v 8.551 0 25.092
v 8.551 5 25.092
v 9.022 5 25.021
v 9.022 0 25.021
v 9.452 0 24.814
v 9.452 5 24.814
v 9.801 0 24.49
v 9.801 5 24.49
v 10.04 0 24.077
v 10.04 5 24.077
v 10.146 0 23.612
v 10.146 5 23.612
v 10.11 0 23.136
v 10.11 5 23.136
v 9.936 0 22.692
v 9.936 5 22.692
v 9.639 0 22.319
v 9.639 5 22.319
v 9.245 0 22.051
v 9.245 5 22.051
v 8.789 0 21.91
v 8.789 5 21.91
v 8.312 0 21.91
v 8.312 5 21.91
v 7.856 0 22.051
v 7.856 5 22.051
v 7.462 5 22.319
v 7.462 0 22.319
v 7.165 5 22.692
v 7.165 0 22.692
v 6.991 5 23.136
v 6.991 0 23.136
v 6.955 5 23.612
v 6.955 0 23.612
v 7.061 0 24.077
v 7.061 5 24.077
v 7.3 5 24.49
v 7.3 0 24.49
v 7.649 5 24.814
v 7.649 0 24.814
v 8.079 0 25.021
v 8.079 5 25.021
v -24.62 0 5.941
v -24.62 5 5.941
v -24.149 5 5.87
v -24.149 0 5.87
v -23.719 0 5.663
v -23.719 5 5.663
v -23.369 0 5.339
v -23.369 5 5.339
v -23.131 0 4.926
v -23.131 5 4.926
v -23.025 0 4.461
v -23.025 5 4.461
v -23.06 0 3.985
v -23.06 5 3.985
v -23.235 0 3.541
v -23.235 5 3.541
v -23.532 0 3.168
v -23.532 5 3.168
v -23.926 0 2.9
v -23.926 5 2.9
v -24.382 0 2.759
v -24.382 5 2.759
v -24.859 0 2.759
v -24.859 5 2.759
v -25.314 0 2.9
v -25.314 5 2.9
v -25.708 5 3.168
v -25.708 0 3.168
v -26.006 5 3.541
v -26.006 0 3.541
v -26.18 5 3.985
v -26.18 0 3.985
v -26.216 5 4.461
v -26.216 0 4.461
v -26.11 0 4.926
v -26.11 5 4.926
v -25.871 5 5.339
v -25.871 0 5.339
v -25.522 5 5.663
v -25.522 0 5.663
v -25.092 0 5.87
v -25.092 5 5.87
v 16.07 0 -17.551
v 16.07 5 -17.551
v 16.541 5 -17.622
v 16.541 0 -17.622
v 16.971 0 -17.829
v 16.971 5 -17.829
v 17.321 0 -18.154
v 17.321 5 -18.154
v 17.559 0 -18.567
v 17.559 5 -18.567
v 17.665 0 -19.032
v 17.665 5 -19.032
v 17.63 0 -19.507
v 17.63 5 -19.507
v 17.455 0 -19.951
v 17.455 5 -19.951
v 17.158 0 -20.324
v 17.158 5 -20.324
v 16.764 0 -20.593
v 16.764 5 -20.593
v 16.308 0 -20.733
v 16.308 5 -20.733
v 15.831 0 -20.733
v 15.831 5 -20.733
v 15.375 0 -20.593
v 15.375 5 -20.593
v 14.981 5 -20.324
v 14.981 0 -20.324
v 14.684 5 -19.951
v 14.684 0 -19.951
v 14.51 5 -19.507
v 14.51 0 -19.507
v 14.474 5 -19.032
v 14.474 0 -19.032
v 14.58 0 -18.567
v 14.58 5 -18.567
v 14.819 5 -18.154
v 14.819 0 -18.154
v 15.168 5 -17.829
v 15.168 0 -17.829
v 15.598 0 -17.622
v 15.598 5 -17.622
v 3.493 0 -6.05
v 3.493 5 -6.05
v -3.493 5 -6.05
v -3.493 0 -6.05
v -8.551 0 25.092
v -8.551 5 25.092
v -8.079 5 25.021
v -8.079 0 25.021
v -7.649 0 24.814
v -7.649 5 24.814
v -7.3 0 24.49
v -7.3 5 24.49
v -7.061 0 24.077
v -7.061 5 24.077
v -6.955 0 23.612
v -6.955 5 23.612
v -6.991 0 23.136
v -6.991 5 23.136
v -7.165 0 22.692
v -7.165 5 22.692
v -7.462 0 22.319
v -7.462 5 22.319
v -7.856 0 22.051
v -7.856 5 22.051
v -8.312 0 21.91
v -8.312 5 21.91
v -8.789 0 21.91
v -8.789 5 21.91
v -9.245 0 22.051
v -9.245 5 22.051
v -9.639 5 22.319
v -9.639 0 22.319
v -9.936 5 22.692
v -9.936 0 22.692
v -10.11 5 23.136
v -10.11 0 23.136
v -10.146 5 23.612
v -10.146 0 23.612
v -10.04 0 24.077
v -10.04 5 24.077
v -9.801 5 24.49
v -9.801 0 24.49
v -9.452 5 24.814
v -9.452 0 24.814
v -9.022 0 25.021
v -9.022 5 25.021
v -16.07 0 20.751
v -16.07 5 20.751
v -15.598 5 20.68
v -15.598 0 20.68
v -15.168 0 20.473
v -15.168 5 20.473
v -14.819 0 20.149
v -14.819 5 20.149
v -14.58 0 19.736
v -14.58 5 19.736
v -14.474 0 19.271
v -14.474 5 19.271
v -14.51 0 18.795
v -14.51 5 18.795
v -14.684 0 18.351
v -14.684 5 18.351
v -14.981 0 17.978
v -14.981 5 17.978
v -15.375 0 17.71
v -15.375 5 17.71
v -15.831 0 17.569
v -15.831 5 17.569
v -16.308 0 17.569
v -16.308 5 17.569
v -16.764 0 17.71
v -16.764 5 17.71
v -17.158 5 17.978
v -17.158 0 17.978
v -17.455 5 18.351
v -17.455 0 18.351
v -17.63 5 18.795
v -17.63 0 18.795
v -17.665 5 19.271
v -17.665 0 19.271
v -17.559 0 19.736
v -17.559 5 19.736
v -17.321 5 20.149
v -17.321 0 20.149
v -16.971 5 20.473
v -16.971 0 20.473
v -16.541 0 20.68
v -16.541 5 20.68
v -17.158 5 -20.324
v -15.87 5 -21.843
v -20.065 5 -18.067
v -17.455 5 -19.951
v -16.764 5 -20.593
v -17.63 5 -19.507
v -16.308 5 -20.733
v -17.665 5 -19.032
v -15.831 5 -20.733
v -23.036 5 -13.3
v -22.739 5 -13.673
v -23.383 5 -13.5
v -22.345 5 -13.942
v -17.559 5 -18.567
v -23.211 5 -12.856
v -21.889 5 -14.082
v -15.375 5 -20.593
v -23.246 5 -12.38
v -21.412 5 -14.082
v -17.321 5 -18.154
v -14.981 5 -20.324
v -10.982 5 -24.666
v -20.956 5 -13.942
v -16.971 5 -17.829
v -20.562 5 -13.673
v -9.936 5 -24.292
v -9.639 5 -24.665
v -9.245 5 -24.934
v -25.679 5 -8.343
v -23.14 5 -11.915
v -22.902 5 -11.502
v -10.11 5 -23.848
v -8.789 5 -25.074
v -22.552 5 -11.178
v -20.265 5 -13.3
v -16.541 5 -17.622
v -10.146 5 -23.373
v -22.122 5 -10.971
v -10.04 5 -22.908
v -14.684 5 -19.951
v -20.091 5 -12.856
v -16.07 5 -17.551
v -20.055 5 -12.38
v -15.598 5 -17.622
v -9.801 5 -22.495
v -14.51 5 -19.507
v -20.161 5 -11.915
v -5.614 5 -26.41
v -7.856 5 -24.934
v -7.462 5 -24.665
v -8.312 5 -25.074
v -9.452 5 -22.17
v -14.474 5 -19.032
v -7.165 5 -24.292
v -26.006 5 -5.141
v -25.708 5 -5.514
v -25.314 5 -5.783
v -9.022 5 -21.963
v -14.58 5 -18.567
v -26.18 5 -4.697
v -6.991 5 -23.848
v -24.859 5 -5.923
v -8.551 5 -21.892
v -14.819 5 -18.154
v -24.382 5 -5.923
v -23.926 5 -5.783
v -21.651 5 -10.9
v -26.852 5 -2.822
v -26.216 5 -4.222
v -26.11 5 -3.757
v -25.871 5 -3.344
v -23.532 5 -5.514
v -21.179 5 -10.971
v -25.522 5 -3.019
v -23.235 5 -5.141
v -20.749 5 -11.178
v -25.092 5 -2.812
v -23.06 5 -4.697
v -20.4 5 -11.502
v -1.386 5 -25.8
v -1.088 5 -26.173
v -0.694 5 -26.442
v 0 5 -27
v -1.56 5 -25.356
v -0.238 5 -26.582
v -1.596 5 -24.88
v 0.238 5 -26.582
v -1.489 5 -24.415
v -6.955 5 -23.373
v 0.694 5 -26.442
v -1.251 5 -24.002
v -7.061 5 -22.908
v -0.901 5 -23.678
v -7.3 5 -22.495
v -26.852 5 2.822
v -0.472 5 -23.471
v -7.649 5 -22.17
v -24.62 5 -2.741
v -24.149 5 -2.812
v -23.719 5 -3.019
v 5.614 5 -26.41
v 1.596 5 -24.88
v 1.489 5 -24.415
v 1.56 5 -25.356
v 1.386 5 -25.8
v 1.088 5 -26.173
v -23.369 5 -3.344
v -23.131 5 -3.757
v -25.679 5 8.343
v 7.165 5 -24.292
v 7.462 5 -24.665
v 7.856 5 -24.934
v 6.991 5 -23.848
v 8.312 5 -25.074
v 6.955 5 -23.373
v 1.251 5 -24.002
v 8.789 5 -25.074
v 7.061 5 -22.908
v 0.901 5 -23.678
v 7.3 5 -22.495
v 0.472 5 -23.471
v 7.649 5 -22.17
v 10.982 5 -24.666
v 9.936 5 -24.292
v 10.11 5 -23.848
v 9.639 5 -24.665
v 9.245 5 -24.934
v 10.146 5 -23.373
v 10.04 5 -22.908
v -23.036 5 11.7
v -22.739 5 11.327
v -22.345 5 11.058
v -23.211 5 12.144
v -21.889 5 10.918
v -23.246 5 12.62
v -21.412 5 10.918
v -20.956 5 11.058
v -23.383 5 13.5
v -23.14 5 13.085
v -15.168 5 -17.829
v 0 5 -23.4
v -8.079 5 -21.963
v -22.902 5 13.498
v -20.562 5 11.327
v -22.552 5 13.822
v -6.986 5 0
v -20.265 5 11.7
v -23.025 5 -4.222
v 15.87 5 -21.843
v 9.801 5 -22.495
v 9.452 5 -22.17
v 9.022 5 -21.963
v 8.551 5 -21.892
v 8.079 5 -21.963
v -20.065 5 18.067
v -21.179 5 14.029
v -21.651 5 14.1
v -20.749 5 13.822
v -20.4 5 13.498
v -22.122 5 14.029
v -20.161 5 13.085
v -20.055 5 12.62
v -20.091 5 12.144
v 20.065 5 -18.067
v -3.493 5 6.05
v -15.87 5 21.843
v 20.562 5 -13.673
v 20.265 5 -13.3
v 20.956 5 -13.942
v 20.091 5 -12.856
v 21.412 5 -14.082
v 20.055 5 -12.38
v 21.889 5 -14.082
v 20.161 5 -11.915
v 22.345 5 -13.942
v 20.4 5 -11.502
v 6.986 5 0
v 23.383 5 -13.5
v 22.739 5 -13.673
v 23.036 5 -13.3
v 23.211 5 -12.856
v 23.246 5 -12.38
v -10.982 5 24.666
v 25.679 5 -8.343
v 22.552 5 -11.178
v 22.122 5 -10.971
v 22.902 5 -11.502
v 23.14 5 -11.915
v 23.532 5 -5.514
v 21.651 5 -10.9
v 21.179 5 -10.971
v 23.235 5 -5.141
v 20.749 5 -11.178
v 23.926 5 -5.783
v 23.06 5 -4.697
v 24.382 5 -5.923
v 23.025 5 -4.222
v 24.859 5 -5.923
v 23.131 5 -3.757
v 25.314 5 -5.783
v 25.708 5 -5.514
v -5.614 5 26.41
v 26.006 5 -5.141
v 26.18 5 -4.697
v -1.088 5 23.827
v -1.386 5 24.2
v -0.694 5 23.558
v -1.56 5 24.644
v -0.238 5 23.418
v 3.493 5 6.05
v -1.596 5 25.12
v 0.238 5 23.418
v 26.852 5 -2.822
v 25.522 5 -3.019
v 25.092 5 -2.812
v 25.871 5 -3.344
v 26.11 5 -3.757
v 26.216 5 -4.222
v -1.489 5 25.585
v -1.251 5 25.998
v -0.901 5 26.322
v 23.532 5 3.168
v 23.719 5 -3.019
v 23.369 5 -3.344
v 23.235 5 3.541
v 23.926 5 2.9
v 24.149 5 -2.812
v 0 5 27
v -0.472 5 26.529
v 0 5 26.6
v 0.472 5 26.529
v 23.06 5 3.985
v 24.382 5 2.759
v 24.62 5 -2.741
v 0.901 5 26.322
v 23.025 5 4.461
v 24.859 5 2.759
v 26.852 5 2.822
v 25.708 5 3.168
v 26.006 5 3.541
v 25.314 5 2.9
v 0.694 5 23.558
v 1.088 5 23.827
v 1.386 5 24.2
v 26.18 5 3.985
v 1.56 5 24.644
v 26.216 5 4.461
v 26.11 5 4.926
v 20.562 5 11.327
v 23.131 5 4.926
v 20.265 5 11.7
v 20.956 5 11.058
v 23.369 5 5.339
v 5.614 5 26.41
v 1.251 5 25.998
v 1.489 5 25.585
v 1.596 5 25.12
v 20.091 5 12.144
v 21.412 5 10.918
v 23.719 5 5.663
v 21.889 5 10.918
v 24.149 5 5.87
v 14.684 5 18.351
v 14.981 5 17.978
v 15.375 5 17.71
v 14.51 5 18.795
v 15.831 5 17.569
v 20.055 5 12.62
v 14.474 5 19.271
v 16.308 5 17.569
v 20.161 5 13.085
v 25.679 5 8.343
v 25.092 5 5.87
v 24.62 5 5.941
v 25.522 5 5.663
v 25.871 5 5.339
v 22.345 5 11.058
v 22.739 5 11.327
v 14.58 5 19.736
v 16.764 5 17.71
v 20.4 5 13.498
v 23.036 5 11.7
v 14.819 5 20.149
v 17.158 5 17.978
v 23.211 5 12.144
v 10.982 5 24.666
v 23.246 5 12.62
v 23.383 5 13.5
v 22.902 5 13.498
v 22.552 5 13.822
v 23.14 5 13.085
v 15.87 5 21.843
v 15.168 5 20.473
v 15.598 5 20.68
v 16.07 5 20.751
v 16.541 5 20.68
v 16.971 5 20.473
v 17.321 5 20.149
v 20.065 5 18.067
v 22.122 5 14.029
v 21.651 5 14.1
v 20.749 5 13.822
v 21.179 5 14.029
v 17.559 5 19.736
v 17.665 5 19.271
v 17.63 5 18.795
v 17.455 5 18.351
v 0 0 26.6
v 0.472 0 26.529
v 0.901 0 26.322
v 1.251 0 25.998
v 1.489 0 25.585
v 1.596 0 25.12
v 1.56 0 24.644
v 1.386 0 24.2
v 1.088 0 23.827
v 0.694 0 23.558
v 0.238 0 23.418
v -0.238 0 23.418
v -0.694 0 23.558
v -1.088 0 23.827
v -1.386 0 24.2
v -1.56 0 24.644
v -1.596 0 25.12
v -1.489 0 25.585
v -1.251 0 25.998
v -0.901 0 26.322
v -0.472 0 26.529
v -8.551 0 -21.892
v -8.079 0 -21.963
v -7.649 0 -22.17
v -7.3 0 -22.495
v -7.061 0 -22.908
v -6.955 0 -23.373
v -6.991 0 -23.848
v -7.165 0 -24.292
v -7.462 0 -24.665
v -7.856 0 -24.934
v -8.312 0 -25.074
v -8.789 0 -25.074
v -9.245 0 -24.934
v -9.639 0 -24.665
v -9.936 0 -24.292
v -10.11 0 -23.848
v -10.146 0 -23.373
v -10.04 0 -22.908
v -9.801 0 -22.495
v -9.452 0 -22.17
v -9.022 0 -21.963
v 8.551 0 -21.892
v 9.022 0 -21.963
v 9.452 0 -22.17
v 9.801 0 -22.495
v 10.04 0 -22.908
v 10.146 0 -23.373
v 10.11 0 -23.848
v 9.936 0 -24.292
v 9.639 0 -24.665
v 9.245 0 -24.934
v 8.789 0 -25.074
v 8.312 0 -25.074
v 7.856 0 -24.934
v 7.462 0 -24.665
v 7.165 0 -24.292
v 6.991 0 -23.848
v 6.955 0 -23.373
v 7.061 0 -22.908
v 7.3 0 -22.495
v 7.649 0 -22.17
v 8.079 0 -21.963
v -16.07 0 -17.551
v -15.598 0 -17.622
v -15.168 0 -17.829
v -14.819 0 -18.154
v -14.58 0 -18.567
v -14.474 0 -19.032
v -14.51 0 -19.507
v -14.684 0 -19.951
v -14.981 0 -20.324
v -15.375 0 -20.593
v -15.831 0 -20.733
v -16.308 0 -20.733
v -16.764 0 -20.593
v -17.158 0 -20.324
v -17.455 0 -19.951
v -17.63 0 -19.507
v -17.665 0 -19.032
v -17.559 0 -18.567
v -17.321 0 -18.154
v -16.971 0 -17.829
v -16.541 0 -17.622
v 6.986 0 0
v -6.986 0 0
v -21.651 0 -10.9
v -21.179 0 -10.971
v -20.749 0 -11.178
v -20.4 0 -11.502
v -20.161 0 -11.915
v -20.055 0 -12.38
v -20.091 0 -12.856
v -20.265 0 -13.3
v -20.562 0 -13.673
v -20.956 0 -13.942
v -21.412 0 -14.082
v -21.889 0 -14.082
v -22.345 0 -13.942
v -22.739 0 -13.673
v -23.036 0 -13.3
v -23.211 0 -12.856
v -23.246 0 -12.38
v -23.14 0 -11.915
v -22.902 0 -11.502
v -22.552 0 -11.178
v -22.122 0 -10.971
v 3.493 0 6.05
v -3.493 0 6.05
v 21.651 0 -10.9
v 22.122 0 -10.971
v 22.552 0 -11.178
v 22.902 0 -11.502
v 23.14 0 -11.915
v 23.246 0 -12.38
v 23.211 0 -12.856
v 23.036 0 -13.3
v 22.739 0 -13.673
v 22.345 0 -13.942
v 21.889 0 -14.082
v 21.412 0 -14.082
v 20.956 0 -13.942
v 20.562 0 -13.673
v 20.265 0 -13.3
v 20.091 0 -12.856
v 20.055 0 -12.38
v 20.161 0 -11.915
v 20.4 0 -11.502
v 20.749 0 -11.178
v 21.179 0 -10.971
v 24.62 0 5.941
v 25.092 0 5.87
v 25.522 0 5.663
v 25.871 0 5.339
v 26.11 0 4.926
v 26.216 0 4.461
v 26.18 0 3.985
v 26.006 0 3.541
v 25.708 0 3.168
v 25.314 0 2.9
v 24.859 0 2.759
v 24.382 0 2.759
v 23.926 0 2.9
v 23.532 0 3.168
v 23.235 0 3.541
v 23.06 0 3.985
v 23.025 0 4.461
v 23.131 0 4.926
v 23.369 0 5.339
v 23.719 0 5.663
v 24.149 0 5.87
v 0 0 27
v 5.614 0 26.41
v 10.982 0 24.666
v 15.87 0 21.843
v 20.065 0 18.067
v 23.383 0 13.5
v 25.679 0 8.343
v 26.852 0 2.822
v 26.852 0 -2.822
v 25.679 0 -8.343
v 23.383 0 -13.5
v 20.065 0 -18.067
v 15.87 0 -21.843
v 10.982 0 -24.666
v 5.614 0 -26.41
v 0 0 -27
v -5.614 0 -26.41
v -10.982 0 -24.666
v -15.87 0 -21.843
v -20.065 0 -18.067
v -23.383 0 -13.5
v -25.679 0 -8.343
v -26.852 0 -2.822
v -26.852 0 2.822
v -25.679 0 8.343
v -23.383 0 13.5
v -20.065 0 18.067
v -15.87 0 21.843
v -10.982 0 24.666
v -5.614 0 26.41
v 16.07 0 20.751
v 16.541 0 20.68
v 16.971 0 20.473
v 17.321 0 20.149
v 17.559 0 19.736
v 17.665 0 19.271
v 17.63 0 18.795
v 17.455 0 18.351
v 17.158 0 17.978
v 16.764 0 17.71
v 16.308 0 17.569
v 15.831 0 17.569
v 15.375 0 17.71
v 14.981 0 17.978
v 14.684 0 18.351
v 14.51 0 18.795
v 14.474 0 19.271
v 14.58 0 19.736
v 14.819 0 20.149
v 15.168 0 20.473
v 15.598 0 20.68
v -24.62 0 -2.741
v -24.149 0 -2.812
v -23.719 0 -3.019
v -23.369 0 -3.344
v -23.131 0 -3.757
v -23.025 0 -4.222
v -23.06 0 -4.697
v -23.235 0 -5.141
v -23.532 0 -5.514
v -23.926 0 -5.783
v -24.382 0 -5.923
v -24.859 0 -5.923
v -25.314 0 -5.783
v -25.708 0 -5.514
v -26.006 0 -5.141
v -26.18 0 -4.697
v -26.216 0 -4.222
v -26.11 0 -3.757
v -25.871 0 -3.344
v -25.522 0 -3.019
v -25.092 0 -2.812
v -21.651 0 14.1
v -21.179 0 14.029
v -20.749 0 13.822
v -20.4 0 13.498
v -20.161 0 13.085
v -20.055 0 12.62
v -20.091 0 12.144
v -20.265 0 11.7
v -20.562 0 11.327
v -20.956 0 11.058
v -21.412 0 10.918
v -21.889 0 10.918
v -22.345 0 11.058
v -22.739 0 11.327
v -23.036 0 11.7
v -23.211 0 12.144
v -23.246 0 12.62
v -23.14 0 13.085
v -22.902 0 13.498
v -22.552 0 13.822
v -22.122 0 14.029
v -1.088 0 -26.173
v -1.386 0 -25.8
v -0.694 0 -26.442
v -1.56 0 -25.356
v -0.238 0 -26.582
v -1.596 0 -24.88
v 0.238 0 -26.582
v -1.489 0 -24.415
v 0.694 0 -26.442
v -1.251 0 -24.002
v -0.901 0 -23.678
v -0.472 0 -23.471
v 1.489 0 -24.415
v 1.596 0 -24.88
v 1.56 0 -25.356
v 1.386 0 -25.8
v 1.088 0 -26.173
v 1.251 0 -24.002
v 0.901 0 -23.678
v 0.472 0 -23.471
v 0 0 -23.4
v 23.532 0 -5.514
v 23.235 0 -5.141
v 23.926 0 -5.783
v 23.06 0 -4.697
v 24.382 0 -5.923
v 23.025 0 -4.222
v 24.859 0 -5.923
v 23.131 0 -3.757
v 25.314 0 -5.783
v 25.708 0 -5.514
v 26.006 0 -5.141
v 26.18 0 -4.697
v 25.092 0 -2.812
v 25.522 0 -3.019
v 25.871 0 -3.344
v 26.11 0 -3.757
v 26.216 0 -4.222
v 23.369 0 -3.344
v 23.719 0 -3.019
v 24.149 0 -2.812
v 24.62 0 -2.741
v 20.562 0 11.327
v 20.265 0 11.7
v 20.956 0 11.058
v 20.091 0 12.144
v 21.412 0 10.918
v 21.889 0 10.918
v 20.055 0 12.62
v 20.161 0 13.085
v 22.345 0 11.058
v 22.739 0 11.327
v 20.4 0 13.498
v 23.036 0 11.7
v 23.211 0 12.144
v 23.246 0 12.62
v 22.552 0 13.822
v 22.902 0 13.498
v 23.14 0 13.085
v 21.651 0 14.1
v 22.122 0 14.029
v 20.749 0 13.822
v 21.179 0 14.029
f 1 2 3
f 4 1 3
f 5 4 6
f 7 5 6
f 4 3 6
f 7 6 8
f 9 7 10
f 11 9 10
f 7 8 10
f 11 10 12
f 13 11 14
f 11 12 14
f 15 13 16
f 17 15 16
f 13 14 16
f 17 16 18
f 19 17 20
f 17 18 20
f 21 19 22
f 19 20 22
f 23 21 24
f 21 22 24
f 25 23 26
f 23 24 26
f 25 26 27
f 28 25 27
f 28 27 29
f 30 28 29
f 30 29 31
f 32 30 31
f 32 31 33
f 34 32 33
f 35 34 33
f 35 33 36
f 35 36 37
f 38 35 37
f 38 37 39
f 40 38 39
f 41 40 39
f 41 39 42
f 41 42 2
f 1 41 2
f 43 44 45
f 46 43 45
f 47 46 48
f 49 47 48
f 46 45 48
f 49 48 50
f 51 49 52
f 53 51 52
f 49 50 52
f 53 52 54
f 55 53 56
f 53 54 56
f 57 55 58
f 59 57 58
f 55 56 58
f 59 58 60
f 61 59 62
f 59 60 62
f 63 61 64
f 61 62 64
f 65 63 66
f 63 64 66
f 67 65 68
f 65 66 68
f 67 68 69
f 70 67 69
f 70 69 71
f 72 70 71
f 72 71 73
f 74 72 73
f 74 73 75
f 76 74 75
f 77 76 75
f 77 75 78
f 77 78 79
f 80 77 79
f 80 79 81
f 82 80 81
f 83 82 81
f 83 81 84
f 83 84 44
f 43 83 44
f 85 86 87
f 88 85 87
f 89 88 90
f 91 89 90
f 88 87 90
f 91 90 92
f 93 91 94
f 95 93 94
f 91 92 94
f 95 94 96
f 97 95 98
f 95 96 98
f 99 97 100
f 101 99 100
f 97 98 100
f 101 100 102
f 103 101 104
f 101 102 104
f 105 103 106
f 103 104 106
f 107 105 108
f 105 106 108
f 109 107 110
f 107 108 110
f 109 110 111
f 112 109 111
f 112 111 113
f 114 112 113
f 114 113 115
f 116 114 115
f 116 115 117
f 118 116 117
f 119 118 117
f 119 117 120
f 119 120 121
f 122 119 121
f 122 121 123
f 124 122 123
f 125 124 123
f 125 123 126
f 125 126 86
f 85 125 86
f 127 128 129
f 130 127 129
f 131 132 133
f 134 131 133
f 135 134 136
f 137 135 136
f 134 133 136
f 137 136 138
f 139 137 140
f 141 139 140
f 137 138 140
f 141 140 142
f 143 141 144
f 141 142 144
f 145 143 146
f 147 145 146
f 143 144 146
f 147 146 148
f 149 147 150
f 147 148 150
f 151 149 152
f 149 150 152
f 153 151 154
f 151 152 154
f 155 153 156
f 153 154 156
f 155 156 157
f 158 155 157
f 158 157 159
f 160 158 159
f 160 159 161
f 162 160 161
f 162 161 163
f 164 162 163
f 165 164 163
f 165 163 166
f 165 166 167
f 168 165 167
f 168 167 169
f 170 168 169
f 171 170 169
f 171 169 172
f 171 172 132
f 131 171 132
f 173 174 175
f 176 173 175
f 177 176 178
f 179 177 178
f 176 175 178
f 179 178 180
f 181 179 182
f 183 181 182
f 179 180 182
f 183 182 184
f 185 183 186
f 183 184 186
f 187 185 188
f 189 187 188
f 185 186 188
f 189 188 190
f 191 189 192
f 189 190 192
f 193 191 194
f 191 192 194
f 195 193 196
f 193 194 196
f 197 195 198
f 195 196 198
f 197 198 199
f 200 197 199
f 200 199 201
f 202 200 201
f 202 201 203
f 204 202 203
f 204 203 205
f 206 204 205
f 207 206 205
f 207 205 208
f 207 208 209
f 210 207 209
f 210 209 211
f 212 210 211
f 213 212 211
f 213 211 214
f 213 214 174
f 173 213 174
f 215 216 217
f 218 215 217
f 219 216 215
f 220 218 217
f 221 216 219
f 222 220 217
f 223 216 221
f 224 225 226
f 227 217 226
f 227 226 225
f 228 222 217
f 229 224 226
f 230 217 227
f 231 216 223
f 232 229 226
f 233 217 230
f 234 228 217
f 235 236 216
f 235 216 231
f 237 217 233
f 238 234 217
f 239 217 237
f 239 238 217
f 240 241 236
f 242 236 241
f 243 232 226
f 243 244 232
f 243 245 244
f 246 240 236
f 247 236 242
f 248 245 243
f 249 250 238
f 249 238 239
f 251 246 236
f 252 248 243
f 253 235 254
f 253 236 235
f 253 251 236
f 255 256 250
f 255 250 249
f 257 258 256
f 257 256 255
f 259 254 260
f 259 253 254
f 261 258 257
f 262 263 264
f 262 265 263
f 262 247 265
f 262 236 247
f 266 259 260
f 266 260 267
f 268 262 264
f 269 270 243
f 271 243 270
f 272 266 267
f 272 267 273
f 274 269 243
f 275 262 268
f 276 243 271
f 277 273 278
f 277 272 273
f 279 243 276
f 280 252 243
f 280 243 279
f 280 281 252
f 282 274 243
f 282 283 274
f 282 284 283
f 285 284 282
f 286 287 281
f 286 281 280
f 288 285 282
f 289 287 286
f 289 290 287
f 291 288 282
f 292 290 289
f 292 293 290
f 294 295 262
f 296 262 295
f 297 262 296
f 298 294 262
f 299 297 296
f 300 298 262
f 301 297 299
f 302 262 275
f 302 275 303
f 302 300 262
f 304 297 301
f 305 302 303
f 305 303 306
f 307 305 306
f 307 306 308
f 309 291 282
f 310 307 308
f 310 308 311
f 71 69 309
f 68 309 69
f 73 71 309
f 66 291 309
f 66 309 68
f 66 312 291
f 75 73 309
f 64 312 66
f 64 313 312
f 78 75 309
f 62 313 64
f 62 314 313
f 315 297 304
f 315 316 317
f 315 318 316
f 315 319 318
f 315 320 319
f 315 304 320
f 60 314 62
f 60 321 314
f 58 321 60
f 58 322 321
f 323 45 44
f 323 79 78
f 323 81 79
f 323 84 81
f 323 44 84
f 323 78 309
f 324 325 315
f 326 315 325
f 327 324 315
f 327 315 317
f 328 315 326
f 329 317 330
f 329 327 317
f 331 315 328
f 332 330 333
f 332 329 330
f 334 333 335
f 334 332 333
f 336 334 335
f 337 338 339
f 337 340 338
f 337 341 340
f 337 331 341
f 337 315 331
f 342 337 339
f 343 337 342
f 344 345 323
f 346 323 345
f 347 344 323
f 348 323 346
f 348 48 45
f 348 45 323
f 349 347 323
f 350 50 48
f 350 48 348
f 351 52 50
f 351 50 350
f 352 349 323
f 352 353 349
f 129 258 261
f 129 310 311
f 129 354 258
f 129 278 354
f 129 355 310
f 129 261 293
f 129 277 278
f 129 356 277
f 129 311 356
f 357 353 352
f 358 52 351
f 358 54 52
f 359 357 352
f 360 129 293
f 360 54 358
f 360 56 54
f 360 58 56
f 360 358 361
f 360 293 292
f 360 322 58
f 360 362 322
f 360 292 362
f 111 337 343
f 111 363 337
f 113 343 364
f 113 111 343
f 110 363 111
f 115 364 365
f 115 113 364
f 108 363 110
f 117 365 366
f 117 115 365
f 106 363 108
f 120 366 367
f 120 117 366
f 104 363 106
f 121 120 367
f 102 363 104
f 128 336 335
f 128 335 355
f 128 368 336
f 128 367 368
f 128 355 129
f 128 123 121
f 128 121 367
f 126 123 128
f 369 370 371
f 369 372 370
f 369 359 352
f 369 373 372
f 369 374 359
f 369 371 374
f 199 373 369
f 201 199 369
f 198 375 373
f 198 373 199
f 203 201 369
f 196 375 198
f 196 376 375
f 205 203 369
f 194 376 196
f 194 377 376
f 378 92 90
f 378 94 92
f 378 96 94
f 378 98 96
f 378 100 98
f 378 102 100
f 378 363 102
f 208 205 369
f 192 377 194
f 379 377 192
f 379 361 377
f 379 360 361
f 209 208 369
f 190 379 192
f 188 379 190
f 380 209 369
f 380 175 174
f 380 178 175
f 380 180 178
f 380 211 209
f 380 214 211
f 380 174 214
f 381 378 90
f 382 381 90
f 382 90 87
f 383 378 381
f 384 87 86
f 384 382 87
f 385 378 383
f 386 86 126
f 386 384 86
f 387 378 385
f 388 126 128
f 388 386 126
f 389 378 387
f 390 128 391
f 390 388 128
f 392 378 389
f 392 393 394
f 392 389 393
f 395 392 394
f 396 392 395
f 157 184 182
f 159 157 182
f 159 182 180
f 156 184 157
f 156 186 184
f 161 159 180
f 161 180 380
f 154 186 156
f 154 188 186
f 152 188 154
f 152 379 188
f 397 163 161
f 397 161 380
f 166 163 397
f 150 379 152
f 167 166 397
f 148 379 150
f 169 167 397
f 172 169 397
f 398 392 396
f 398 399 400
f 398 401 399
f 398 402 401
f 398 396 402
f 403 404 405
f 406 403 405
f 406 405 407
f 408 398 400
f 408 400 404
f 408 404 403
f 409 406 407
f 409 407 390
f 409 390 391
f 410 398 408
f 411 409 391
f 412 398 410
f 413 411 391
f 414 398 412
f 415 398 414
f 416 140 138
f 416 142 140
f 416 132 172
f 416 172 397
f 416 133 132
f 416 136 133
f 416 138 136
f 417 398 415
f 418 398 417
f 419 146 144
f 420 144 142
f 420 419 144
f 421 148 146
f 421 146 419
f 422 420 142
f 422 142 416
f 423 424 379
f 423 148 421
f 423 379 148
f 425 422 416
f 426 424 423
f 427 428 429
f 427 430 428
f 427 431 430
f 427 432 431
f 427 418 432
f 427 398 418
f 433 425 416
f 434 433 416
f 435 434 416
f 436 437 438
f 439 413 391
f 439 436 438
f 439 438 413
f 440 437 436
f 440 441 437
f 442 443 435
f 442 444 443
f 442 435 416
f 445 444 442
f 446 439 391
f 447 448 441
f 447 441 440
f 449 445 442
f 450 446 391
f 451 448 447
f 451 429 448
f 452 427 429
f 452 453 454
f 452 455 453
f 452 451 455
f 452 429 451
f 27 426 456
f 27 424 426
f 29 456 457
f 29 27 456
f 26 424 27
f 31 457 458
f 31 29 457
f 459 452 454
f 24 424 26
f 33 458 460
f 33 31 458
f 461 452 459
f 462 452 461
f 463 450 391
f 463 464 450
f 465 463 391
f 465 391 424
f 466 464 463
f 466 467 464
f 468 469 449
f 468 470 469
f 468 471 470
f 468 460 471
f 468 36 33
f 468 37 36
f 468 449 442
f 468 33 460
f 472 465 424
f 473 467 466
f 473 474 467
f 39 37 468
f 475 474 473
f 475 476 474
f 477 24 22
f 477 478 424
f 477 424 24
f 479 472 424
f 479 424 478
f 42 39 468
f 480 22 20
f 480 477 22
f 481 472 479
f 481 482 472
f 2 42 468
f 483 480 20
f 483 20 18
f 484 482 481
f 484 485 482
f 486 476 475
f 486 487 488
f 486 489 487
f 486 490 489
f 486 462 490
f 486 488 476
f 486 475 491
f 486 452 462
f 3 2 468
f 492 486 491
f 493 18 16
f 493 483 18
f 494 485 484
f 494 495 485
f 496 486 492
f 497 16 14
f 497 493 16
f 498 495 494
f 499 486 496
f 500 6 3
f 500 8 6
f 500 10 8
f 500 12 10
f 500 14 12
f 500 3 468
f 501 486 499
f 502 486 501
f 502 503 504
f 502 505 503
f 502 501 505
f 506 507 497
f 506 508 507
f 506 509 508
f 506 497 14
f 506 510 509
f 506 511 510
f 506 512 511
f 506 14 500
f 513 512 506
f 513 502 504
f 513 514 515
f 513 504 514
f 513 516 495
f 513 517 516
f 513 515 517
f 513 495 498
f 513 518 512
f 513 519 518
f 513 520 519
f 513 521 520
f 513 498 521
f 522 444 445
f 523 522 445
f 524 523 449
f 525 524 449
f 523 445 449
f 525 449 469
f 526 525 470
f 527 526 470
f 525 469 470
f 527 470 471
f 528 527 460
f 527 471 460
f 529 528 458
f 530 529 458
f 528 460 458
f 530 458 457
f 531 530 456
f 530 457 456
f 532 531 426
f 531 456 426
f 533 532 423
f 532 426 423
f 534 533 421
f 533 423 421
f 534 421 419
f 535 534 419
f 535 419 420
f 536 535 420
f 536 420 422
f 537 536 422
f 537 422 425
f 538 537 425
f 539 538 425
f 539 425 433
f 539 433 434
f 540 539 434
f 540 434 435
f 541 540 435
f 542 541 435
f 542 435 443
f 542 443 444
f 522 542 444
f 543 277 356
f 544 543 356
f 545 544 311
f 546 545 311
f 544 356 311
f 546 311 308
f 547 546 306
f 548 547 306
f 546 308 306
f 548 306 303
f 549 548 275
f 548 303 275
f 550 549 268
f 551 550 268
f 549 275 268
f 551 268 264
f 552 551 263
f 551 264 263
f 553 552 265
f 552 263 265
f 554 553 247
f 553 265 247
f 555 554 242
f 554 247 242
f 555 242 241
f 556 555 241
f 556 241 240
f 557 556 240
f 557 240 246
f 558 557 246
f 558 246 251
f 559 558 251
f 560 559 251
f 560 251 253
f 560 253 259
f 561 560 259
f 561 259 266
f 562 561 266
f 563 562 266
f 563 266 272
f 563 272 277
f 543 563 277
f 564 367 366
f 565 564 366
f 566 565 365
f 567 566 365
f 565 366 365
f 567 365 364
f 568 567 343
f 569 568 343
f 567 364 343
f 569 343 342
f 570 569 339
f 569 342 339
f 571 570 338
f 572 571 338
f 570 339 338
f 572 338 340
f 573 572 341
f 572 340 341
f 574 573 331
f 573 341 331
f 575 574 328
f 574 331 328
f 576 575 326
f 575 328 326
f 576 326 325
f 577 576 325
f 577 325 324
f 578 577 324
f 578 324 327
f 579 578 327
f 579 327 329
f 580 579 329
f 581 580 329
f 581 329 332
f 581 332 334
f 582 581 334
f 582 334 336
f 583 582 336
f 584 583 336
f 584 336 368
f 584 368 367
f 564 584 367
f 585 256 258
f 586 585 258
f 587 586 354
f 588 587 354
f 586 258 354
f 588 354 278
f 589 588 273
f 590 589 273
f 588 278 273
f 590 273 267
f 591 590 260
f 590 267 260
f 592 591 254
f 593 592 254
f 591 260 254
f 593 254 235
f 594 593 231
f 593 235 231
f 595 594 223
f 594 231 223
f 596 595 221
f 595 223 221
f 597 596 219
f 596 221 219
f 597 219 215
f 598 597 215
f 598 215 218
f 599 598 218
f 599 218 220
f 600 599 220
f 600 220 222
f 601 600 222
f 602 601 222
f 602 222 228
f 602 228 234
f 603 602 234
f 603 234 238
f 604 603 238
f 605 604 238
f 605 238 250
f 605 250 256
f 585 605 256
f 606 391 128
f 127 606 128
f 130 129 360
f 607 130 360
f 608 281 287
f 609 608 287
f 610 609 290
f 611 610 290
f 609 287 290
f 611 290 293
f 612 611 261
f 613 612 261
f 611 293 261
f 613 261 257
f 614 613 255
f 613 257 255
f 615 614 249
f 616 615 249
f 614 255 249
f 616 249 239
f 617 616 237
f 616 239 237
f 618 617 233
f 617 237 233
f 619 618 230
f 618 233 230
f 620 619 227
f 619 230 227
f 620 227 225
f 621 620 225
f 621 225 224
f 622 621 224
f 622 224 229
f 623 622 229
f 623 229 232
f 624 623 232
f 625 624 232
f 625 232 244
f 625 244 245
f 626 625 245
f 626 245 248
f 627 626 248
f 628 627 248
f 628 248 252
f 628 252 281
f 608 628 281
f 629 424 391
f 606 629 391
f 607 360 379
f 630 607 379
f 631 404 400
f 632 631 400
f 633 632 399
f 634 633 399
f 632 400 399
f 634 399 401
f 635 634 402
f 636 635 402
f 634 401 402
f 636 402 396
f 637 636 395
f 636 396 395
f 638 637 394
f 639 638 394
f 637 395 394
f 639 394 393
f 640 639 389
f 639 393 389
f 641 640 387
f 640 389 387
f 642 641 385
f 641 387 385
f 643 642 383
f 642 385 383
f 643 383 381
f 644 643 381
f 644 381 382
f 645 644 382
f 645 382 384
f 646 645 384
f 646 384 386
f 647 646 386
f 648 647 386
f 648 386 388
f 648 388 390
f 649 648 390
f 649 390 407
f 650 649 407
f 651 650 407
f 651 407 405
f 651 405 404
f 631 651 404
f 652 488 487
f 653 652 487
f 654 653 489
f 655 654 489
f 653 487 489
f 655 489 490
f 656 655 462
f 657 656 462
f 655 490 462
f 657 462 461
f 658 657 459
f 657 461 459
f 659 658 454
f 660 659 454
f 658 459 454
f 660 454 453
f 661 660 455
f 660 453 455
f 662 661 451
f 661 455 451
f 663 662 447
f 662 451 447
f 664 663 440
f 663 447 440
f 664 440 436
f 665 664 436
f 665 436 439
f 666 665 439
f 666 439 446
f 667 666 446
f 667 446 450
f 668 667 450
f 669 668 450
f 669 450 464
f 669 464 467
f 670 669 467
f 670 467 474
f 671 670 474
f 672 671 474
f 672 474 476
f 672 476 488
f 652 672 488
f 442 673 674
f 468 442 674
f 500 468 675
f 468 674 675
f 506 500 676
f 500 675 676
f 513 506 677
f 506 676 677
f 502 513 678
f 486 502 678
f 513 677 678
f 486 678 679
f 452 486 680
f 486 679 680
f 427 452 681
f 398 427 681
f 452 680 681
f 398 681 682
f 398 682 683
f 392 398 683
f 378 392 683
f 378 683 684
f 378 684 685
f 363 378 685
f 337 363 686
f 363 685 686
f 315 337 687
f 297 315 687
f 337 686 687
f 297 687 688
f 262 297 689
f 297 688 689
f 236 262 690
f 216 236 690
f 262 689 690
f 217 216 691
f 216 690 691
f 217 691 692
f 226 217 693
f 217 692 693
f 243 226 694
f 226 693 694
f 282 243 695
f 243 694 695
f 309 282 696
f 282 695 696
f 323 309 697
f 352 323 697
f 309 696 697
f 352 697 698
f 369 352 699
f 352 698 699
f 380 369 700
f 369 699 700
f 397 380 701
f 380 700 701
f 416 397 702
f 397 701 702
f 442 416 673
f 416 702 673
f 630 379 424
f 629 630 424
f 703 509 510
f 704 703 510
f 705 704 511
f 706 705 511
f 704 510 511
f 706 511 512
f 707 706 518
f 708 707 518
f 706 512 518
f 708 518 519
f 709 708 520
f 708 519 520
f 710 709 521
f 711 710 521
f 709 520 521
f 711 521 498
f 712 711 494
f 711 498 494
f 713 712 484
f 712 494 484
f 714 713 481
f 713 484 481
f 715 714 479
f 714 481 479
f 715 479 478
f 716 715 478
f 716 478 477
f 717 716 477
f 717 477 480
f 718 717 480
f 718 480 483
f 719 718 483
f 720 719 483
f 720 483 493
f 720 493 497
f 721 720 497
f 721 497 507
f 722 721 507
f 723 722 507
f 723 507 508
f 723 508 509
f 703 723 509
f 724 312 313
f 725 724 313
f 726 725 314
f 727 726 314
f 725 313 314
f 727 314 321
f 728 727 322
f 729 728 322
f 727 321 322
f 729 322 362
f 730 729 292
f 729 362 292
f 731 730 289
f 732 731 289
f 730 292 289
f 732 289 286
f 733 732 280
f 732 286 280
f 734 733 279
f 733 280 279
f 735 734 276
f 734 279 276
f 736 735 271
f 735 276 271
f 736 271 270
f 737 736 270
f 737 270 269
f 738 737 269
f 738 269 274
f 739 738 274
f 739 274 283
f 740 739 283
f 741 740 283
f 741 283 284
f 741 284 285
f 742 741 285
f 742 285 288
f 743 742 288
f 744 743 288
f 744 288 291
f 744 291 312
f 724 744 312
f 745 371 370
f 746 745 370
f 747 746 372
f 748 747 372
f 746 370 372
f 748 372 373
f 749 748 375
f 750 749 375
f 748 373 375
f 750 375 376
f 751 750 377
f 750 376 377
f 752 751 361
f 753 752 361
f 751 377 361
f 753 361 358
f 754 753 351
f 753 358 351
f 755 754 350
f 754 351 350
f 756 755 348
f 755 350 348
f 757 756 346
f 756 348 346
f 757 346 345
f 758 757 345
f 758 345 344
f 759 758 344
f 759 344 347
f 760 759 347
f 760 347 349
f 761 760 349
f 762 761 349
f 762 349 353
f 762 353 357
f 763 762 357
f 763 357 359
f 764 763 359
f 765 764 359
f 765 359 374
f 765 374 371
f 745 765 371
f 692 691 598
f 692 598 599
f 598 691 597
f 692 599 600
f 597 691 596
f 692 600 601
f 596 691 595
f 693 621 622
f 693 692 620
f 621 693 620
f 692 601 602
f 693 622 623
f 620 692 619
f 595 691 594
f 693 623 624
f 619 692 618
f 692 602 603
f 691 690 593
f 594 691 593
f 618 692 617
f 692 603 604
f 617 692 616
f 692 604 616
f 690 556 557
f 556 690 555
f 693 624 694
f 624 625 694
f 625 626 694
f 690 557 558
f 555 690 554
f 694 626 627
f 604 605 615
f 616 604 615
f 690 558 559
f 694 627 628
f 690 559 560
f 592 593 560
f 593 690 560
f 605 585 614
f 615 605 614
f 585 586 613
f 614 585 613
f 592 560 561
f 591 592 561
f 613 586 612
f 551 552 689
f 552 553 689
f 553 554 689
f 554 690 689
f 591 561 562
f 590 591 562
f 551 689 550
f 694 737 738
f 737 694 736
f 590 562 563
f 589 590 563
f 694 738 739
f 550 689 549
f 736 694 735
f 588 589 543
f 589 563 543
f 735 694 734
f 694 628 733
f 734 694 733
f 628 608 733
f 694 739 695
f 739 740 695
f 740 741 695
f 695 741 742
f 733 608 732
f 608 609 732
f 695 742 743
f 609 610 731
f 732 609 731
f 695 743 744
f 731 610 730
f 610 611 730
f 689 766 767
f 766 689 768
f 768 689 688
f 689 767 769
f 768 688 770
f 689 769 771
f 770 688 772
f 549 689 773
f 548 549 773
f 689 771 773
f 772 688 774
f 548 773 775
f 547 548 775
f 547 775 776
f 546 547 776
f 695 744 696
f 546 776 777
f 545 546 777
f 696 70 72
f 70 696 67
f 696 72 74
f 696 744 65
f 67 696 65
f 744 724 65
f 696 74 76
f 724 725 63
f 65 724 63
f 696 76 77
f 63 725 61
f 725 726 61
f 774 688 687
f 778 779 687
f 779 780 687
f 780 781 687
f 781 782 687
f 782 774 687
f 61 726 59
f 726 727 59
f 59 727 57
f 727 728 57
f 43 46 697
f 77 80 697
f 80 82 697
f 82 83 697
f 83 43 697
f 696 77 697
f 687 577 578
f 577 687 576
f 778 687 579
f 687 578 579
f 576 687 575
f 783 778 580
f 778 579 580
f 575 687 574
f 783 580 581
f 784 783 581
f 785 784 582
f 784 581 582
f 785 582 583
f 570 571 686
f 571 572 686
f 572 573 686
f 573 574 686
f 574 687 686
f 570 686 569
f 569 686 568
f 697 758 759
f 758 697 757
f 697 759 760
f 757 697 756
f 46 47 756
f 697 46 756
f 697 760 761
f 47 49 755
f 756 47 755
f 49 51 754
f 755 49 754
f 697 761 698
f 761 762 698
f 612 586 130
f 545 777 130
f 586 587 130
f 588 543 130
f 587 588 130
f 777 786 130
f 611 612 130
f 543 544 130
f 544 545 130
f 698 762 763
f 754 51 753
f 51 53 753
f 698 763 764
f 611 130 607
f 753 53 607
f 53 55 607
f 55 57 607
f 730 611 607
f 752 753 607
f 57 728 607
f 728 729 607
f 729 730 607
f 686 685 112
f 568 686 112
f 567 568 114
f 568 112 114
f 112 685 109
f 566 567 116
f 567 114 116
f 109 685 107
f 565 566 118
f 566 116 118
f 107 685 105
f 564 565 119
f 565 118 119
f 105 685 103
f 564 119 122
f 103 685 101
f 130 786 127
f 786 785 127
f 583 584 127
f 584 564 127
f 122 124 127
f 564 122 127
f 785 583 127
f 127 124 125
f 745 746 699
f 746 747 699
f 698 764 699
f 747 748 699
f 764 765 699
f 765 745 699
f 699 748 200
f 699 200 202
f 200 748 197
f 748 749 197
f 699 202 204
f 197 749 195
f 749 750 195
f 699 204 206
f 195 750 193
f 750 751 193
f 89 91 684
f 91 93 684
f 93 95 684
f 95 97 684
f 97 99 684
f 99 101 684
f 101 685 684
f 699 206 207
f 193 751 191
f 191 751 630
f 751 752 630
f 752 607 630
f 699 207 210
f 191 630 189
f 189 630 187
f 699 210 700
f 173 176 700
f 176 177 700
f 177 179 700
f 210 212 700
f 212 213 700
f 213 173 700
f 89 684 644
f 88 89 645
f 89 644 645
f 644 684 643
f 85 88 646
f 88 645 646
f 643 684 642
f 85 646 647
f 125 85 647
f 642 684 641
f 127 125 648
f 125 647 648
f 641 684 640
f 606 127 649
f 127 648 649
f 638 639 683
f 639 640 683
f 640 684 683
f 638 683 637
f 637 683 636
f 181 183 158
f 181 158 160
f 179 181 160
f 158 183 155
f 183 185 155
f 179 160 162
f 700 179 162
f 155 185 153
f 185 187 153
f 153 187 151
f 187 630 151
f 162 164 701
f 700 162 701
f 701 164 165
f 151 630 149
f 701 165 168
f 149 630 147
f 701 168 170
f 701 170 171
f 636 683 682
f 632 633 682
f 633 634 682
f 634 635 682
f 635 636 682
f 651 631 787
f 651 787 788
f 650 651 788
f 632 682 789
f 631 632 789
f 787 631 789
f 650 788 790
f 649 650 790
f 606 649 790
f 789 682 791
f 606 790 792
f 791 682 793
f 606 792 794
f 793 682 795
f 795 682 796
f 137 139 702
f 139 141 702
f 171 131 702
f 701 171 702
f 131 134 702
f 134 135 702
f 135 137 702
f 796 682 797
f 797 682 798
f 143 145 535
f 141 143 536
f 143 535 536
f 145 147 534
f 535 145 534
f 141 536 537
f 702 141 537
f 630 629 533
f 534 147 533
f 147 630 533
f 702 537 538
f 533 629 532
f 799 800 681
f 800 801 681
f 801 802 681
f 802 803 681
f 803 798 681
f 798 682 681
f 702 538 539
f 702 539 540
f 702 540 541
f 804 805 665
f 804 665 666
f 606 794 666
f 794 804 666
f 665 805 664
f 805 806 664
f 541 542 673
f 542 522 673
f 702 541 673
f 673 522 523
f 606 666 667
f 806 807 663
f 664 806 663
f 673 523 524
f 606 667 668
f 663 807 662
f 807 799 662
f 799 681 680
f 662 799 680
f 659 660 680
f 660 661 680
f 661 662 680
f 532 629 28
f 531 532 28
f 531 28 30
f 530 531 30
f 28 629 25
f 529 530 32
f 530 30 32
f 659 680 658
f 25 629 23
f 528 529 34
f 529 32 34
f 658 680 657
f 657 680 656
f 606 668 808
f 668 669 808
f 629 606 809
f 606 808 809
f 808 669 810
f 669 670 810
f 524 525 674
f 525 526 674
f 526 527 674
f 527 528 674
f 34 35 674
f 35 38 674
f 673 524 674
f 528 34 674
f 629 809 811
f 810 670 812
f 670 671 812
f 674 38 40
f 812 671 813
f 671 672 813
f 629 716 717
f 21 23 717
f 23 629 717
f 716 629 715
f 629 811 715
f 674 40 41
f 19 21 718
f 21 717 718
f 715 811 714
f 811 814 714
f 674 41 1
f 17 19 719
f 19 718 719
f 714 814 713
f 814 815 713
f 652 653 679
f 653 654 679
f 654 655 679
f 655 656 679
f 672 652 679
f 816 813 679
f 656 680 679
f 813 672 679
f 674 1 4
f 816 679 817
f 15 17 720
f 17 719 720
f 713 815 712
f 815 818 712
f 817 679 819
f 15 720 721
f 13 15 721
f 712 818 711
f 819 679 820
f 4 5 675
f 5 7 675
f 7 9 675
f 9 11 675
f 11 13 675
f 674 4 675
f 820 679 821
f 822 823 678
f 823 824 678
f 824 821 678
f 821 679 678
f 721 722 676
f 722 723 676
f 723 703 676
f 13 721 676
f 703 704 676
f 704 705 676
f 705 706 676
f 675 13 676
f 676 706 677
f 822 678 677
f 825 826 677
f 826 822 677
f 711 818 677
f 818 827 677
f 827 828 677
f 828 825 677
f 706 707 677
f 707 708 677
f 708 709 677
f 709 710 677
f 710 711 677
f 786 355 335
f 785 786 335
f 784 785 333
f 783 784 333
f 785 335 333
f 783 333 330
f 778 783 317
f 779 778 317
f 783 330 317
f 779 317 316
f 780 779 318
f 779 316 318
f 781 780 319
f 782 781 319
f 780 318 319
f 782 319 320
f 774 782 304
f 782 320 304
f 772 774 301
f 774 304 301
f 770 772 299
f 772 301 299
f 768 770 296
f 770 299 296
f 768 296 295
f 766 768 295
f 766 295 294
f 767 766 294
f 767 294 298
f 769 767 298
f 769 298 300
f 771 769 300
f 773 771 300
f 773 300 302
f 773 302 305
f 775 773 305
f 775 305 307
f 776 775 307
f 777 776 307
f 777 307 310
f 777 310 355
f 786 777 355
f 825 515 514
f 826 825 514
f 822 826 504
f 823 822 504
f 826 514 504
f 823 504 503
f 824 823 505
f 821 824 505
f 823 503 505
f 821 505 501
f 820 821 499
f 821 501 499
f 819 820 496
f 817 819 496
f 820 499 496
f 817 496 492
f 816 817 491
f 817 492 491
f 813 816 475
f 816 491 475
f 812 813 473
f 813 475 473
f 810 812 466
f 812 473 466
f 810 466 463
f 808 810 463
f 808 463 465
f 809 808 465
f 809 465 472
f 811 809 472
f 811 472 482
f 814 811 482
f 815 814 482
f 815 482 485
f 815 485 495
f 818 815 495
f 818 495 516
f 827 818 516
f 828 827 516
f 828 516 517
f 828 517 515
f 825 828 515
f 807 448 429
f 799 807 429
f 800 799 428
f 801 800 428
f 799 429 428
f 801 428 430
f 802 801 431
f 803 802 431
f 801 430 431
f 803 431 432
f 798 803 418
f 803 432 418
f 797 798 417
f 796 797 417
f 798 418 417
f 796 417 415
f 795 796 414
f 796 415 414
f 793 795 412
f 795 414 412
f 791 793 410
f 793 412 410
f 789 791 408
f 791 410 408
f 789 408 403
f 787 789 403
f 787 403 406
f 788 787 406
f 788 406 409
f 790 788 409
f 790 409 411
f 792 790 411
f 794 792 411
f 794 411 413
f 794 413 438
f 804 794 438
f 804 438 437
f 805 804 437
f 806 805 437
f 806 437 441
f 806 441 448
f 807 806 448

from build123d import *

# Parameters (mm, degrees)
SKETCH_1_R          = 27
SKETCH_1_R_2        = 2
EXTRUDE_1_DEPTH     = 5
CUT_EXTRUDE_1_DEPTH = 5
SKETCH_3_R          = 1.6
CUT_EXTRUDE_2_DEPTH = 10


with BuildPart() as part:
    # 草图1 → 凸台-拉伸1 (new body)
    with BuildSketch(Plane(origin=(0, 0, 0), x_dir=(1, 0, 0), z_dir=(0, 1, 0))):
        with Locations(Location((0, 0, 0), (0, 0, 270))):
            Circle(SKETCH_1_R)
        with Locations(Location((0, 0, 0), (0, 0, 270))):
            Circle(SKETCH_1_R_2, mode=Mode.SUBTRACT)
    extrude(amount=EXTRUDE_1_DEPTH)

    # 草图2 → 切除-拉伸1 (cut)
    with BuildSketch(Plane(origin=(0, 5, 0), x_dir=(1, 0, 0), z_dir=(0, 1, 0))):
        Polygon((-3.492969129, -6.05), (3.492969129, -6.05), (6.985938257, 0), (3.492969129, 6.05), (-3.492969129, 6.05), (-6.985938257, 0), align=None)
    extrude(amount=-CUT_EXTRUDE_1_DEPTH, mode=Mode.SUBTRACT)

    # 草图3 → 切除-拉伸2 (cut)
    with BuildSketch(Plane(origin=(0, 5, 0), x_dir=(1, 0, 0), z_dir=(0, 1, 0))):
        with Locations(Location((0, 25, 0), (0, 0, 270))):
            Circle(SKETCH_3_R)
        with Locations(Location((8.550503583, 23.49231552, 0), (0, 0, 270))):
            Circle(SKETCH_3_R)
        with Locations(Location((16.069690242, 19.151111078, 0), (0, 0, 270))):
            Circle(SKETCH_3_R)
        with Locations(Location((21.650635095, 12.5, 0), (0, 0, 270))):
            Circle(SKETCH_3_R)
        with Locations(Location((24.620193825, 4.341204442, 0), (0, 0, 270))):
            Circle(SKETCH_3_R)
        with Locations(Location((24.620193825, -4.341204442, 0), (0, 0, 270))):
            Circle(SKETCH_3_R)
        with Locations(Location((21.650635095, -12.5, 0), (0, 0, 270))):
            Circle(SKETCH_3_R)
        with Locations(Location((16.069690242, -19.151111078, 0), (0, 0, 270))):
            Circle(SKETCH_3_R)
        with Locations(Location((8.550503583, -23.49231552, 0), (0, 0, 270))):
            Circle(SKETCH_3_R)
        with Locations(Location((0, -25, 0), (0, 0, 270))):
            Circle(SKETCH_3_R)
        with Locations(Location((-8.550503583, -23.49231552, 0), (0, 0, 270))):
            Circle(SKETCH_3_R)
        with Locations(Location((-16.069690242, -19.151111078, 0), (0, 0, 270))):
            Circle(SKETCH_3_R)
        with Locations(Location((-21.650635095, -12.5, 0), (0, 0, 270))):
            Circle(SKETCH_3_R)
        with Locations(Location((-24.620193825, -4.341204442, 0), (0, 0, 270))):
            Circle(SKETCH_3_R)
        with Locations(Location((-24.620193825, 4.341204442, 0), (0, 0, 270))):
            Circle(SKETCH_3_R)
        with Locations(Location((-21.650635095, 12.5, 0), (0, 0, 270))):
            Circle(SKETCH_3_R)
        with Locations(Location((-16.069690242, 19.151111078, 0), (0, 0, 270))):
            Circle(SKETCH_3_R)
        with Locations(Location((-8.550503583, 23.49231552, 0), (0, 0, 270))):
            Circle(SKETCH_3_R)
    extrude(amount=-CUT_EXTRUDE_2_DEPTH, mode=Mode.SUBTRACT)


solid = part.part
